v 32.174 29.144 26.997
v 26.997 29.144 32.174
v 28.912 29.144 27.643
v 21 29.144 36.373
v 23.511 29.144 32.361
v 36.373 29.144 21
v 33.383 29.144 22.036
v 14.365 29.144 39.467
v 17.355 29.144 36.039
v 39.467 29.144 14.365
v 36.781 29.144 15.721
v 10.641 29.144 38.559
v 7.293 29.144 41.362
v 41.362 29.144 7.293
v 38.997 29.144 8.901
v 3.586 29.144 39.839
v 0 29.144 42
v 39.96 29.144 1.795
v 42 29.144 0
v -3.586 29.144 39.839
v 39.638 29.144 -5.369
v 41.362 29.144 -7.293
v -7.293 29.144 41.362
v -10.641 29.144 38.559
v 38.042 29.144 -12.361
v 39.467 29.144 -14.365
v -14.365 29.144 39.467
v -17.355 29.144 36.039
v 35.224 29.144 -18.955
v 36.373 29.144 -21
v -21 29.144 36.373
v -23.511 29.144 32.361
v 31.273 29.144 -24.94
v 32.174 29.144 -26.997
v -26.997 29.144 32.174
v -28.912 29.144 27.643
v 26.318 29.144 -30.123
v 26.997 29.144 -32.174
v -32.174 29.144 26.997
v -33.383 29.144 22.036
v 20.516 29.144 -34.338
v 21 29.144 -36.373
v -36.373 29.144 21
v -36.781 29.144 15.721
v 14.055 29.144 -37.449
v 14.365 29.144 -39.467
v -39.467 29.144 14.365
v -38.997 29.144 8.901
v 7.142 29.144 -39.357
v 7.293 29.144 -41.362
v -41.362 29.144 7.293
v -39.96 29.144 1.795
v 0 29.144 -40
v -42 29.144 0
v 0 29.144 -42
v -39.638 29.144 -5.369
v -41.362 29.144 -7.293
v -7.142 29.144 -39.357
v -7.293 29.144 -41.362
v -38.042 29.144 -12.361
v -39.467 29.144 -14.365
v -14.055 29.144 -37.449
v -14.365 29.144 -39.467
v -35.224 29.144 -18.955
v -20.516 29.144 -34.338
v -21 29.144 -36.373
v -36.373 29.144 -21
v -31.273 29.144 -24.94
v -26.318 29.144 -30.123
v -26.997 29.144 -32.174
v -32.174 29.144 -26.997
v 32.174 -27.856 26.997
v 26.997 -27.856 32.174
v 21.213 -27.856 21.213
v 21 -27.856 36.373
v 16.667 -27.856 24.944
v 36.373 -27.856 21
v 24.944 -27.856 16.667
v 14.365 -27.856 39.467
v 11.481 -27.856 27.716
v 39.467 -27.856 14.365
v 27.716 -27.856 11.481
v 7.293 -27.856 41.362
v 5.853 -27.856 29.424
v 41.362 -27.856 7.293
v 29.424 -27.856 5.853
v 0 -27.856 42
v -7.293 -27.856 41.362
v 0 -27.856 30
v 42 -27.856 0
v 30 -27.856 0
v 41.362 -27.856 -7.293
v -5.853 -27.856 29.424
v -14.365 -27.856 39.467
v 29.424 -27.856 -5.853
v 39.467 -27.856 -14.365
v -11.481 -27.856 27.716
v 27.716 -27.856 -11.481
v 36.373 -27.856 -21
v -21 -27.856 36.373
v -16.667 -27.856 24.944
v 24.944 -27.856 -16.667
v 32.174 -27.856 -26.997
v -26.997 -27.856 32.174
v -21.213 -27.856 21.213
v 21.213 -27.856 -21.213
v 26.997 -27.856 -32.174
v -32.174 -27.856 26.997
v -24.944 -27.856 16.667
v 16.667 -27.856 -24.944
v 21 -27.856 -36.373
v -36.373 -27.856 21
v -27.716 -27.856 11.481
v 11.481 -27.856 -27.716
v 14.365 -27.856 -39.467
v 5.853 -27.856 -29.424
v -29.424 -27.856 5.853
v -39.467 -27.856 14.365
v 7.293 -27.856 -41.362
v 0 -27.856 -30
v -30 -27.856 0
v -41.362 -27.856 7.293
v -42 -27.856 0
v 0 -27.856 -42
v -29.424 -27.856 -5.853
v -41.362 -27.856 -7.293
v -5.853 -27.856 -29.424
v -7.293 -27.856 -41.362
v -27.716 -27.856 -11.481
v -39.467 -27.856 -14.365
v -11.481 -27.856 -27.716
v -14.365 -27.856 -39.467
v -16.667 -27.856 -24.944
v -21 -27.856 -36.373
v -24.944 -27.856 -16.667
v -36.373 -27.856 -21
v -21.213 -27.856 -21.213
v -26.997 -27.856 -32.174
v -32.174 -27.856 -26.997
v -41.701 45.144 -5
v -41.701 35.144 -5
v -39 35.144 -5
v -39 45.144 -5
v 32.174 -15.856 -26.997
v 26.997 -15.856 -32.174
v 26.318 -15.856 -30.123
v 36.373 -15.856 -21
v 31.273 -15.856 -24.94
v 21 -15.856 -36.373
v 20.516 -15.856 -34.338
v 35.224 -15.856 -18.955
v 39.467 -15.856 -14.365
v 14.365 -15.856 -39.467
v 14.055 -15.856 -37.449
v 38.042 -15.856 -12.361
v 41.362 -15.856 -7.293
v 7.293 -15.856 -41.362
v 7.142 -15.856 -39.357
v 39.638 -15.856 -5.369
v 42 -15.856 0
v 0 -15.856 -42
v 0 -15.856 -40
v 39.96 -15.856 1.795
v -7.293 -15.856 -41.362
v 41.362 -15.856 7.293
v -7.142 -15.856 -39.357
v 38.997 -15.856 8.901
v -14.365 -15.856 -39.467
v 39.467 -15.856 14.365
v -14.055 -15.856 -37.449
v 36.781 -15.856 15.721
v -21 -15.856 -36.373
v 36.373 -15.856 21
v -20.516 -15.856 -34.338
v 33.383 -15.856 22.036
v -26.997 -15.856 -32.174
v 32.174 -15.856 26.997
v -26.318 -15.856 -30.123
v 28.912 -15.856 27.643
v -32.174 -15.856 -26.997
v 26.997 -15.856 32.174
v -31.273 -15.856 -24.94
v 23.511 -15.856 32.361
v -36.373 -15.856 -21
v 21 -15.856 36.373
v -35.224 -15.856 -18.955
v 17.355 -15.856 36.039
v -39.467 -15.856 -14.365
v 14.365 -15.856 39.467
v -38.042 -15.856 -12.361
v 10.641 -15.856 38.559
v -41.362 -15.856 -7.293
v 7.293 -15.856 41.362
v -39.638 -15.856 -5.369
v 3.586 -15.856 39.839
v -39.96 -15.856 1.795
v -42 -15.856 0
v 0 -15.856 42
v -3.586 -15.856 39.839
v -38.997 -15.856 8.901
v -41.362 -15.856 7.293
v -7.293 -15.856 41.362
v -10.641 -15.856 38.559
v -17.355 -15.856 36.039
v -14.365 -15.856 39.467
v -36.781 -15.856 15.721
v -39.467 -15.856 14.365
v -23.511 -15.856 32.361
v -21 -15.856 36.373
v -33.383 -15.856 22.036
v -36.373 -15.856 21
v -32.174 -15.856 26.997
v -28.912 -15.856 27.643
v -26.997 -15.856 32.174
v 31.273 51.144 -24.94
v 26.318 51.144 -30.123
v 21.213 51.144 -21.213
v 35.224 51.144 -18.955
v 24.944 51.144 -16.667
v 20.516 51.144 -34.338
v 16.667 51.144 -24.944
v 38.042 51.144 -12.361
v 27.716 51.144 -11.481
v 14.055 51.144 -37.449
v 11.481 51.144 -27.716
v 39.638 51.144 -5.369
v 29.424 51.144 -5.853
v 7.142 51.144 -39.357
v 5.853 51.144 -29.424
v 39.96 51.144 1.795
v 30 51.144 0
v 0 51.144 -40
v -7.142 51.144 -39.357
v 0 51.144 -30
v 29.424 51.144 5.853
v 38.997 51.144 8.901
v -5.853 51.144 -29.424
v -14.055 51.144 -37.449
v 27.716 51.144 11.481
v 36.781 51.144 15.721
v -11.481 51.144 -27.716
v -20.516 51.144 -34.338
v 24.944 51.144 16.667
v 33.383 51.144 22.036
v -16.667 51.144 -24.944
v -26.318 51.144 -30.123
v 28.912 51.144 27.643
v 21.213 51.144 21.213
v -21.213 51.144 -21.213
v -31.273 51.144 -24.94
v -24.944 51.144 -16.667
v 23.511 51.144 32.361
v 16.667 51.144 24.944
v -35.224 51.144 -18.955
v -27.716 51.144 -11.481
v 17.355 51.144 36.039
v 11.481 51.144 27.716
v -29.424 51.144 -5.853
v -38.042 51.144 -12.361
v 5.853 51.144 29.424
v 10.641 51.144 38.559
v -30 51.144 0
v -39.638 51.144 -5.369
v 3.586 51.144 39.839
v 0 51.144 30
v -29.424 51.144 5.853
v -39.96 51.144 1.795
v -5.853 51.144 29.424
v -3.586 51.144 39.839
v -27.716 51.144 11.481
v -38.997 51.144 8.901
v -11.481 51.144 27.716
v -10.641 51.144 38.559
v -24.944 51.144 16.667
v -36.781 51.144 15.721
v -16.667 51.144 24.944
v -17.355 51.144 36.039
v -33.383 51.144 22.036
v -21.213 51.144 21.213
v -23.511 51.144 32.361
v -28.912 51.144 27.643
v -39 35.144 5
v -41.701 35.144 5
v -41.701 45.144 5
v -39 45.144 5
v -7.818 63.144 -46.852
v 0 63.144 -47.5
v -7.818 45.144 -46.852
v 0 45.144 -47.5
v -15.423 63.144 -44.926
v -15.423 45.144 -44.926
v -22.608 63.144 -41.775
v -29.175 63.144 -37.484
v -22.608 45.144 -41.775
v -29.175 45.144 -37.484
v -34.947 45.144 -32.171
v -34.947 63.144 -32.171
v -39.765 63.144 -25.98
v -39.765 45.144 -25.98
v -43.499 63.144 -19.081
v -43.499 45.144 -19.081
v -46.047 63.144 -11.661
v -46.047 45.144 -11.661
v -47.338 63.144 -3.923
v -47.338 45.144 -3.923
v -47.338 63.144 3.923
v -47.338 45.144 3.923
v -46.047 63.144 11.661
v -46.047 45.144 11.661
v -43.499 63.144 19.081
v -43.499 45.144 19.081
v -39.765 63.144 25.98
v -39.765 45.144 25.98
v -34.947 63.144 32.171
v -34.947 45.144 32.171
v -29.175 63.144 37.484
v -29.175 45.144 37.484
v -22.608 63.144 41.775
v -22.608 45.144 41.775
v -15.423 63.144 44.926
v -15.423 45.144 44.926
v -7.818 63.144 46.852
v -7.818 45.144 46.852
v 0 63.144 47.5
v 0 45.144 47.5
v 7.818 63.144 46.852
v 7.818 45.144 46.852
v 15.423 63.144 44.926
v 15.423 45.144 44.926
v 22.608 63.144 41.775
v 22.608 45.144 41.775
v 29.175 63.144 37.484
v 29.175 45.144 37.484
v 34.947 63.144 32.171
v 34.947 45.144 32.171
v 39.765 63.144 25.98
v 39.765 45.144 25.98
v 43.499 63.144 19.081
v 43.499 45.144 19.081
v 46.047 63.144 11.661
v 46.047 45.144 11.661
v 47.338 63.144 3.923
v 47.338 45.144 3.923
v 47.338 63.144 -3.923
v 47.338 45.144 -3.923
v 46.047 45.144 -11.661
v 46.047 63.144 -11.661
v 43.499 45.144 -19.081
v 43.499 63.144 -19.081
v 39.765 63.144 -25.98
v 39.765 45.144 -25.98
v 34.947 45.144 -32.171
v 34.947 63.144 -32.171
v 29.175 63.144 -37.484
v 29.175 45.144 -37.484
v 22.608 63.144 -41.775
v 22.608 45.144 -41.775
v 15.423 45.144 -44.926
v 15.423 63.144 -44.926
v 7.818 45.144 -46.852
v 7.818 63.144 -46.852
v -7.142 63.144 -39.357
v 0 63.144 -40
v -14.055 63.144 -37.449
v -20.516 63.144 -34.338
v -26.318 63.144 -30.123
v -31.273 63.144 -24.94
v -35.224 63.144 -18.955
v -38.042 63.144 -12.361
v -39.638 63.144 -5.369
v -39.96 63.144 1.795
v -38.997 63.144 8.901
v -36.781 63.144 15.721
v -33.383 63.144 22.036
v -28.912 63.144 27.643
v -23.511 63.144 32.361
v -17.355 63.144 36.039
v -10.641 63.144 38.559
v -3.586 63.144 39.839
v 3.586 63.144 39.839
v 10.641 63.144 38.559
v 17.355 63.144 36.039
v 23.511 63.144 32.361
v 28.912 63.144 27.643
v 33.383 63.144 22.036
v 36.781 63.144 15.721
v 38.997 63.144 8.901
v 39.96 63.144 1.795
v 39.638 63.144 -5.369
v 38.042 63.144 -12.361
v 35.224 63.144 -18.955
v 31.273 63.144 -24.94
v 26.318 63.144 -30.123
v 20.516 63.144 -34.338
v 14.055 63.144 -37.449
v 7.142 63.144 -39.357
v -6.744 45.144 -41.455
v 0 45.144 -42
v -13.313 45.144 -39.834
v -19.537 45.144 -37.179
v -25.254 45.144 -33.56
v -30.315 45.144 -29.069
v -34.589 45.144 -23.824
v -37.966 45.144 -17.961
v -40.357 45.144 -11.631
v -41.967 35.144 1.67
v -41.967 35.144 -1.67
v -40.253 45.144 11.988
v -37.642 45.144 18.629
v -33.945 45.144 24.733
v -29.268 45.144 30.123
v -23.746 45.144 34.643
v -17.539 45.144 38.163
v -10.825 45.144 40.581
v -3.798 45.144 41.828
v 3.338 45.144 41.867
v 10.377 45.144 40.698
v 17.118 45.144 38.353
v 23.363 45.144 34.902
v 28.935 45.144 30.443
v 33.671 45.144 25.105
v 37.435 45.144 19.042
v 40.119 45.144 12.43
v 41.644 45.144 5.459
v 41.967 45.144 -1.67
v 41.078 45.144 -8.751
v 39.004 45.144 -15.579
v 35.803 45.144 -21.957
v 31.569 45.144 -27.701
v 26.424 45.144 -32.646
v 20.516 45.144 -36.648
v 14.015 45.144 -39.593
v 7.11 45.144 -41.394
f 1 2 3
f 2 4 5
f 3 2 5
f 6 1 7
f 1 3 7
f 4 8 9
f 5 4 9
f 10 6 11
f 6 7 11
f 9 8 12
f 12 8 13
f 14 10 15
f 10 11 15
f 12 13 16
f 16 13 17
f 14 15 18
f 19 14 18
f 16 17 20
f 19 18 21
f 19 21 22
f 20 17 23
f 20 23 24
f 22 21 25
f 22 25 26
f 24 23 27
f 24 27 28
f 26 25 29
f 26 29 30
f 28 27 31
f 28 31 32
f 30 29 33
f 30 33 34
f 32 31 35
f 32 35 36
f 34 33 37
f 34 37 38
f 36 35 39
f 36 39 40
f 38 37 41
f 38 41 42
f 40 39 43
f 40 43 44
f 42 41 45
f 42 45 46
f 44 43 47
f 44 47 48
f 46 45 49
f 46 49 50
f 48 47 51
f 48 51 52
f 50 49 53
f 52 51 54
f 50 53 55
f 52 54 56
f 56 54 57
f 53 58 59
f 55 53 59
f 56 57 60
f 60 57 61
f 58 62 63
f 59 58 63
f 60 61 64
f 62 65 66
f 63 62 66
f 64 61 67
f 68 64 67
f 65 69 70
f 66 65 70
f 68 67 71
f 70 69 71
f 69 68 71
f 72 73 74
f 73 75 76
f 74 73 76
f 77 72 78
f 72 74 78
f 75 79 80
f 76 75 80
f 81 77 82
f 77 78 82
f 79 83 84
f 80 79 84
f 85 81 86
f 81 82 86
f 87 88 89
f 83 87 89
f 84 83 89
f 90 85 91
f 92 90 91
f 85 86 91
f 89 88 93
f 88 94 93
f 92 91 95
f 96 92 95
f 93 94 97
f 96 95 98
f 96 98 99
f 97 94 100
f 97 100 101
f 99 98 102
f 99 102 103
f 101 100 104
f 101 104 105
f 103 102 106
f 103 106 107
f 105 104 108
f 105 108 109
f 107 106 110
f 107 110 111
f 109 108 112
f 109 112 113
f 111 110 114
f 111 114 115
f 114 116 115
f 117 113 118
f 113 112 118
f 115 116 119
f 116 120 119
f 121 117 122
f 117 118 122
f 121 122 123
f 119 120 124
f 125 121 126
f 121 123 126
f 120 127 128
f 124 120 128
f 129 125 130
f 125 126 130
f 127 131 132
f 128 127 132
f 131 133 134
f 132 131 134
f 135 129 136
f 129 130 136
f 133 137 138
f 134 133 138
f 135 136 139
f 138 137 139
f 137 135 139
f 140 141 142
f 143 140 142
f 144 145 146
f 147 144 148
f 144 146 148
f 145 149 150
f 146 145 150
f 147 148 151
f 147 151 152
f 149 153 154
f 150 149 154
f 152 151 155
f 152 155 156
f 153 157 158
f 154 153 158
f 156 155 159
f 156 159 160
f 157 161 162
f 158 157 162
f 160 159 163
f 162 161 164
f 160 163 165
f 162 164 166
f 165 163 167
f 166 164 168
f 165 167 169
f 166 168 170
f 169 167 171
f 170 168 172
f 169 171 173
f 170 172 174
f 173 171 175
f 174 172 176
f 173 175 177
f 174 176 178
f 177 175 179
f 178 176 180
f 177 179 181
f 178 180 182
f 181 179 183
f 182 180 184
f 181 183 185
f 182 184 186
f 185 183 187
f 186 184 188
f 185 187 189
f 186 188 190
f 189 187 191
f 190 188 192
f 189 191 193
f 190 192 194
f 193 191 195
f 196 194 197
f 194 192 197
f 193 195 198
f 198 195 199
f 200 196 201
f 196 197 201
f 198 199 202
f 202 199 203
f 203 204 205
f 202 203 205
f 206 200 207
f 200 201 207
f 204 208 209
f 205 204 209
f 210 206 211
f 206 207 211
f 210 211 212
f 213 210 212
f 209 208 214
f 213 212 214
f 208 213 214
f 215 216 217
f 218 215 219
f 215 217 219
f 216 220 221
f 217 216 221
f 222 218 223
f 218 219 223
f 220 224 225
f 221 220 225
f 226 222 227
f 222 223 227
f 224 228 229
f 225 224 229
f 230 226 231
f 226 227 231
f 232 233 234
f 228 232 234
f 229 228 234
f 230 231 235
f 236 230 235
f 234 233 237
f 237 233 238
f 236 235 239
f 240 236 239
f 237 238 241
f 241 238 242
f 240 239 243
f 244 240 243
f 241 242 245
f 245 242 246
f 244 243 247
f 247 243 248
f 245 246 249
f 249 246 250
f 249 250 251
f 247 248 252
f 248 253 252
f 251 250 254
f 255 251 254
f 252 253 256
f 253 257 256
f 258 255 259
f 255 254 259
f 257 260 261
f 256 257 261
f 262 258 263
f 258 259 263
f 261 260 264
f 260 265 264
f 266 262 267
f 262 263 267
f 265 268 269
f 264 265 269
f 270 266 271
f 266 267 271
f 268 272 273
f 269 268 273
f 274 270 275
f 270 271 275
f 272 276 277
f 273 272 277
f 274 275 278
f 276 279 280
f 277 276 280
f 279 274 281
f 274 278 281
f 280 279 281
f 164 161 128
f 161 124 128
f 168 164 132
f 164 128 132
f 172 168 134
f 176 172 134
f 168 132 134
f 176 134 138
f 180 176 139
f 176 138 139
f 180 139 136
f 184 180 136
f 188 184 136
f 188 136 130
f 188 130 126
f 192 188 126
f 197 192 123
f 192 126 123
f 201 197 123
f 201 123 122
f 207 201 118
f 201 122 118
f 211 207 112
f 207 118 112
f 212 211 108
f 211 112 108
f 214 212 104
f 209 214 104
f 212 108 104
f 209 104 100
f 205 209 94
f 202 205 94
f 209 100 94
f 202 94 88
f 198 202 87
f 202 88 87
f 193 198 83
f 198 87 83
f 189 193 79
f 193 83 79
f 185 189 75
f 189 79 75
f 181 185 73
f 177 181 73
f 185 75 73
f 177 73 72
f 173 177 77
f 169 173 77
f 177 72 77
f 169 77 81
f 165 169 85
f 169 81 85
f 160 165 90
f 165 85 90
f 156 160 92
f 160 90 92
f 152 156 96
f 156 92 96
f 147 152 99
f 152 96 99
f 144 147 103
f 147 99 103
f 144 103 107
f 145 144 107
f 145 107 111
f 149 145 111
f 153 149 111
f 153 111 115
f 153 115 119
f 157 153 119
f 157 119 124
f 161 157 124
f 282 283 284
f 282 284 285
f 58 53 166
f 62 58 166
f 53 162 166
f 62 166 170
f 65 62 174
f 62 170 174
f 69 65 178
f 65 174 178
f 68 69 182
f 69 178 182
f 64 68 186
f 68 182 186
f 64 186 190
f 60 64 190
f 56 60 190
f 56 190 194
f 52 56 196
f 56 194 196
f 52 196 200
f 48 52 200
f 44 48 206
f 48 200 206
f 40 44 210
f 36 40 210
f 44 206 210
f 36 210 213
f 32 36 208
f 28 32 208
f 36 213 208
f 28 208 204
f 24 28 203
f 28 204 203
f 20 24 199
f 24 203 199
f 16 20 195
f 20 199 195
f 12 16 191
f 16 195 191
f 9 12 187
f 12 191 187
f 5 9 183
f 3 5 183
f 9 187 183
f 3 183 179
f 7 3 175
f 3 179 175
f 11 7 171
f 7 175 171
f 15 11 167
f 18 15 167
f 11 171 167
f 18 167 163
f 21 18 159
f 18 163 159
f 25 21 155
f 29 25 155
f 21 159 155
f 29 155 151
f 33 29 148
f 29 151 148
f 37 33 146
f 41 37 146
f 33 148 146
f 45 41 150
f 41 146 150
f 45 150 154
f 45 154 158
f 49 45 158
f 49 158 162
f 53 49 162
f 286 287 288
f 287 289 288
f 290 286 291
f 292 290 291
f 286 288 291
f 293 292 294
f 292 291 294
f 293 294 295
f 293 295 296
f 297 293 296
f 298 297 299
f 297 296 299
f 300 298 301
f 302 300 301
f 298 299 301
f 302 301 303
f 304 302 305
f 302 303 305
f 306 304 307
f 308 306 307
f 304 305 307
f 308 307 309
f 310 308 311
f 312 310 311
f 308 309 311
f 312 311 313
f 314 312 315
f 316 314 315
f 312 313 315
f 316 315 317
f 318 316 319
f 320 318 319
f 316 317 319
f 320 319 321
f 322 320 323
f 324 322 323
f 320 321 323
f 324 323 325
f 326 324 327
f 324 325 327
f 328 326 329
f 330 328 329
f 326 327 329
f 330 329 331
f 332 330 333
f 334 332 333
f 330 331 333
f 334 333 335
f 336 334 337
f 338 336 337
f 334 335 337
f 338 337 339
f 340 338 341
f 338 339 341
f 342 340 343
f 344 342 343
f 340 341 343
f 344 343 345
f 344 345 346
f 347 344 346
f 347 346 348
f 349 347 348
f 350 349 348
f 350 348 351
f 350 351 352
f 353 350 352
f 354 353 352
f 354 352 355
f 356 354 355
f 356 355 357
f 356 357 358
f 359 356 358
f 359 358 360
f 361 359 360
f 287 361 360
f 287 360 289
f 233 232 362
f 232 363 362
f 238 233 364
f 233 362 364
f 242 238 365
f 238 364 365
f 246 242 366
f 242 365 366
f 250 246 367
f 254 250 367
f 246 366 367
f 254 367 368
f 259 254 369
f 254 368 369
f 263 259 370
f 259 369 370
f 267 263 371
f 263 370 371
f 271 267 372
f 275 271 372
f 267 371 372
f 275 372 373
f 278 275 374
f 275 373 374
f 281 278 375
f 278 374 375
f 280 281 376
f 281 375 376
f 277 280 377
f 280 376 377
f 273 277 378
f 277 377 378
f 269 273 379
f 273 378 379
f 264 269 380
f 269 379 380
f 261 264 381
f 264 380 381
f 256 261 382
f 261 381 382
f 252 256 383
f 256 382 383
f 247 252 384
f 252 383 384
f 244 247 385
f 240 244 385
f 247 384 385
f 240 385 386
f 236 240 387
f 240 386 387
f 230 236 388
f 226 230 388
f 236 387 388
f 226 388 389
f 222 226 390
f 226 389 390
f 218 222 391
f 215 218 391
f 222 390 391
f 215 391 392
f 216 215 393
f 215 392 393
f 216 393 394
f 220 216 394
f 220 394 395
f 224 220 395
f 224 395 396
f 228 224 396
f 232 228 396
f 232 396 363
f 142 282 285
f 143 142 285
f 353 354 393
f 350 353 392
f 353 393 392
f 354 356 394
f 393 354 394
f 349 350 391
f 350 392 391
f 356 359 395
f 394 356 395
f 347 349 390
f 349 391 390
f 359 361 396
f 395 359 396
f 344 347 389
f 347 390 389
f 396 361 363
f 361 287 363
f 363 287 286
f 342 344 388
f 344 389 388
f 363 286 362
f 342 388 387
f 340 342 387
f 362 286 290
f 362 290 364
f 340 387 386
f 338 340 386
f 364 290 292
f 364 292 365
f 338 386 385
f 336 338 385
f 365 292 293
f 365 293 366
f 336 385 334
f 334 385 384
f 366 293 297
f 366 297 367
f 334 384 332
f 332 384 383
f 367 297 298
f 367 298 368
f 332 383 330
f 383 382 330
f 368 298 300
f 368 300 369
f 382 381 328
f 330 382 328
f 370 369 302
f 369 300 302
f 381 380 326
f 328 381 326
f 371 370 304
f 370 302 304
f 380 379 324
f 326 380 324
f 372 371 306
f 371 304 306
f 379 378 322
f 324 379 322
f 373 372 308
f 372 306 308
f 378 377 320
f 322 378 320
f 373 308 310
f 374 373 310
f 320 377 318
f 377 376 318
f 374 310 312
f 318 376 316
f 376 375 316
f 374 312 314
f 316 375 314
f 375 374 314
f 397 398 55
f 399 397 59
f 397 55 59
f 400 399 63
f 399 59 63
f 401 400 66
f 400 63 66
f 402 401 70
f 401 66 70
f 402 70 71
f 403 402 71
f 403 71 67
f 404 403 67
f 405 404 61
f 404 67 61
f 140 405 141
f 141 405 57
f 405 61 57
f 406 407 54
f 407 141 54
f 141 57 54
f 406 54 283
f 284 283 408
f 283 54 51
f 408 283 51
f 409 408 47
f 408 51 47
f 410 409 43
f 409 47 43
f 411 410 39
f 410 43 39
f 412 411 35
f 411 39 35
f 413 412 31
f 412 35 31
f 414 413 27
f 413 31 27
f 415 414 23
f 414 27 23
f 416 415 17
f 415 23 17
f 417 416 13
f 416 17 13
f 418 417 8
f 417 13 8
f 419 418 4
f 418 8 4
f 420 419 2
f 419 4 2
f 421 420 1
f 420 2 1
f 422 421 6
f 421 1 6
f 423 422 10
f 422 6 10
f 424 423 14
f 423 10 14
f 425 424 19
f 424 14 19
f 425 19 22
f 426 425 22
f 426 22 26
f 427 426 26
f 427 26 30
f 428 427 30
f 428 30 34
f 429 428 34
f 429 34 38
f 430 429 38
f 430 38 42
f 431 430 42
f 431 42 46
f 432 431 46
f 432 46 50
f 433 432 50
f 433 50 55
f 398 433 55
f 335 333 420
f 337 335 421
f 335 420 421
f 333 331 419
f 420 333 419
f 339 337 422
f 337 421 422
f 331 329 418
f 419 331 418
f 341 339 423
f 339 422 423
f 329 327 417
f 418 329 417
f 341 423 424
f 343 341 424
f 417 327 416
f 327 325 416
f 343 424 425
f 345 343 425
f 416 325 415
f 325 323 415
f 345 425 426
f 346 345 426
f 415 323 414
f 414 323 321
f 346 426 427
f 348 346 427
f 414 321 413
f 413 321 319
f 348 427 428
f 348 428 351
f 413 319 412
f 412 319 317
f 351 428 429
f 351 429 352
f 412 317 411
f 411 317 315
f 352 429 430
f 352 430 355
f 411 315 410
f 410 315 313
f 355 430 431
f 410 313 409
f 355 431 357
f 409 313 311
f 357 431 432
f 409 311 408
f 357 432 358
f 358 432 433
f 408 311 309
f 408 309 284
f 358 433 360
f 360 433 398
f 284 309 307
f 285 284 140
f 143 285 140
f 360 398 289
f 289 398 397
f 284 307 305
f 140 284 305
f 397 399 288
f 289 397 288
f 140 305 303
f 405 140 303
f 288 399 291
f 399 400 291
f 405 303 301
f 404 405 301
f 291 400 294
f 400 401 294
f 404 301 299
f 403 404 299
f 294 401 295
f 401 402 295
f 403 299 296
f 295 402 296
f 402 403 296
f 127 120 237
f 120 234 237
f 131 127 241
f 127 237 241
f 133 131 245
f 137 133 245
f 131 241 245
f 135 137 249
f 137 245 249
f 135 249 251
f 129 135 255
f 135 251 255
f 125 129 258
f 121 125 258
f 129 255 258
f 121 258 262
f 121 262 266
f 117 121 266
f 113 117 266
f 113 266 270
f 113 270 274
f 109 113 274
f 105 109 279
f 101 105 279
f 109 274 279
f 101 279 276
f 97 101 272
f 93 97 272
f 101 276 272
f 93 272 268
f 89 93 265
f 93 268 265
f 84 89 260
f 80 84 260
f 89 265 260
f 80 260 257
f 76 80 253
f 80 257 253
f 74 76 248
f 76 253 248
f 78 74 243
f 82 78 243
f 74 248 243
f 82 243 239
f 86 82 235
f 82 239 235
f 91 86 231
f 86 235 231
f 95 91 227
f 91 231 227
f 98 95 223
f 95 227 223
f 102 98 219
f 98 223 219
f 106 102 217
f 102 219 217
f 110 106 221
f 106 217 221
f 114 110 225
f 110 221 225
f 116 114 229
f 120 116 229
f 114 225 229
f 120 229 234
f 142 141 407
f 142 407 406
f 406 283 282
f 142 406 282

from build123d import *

# Parameters (mm, degrees)
SKETCH2_W          = 3
SKETCH2_H          = 10
CUT_EXTRUDE3_DEPTH = 5


with BuildPart() as part:
    # Sketch1 → Revolve1 (revolve)
    with BuildSketch(Plane.XY, mode=Mode.PRIVATE) as revolve1_sk:
        Polygon((30, -27.855726757), (30, 51.144273243), (40, 51.144273243), (40, 63.144273243), (47.5, 63.144273243), (47.5, 45.144273243), (42, 45.144273243), (42, 29.144273243), (40, 29.144273243), (40, -15.855726757), (42, -15.855726757), (42, -27.855726757), align=None)
    revolve(revolve1_sk.sketch.rotate(Axis((0, -44.504269507, 0), (0, 1, 0)), 90), axis=Axis((0, -44.504269507, 0), (0, 1, 0)))

    # Sketch2 → Cut-Extrude3 (cut, symmetric)
    with BuildSketch(Plane.XY):
        with Locations((-40.5, 40.144273243)):
            Rectangle(SKETCH2_W, SKETCH2_H)
    extrude(amount=CUT_EXTRUDE3_DEPTH, both=True, mode=Mode.SUBTRACT)


solid = part.part
